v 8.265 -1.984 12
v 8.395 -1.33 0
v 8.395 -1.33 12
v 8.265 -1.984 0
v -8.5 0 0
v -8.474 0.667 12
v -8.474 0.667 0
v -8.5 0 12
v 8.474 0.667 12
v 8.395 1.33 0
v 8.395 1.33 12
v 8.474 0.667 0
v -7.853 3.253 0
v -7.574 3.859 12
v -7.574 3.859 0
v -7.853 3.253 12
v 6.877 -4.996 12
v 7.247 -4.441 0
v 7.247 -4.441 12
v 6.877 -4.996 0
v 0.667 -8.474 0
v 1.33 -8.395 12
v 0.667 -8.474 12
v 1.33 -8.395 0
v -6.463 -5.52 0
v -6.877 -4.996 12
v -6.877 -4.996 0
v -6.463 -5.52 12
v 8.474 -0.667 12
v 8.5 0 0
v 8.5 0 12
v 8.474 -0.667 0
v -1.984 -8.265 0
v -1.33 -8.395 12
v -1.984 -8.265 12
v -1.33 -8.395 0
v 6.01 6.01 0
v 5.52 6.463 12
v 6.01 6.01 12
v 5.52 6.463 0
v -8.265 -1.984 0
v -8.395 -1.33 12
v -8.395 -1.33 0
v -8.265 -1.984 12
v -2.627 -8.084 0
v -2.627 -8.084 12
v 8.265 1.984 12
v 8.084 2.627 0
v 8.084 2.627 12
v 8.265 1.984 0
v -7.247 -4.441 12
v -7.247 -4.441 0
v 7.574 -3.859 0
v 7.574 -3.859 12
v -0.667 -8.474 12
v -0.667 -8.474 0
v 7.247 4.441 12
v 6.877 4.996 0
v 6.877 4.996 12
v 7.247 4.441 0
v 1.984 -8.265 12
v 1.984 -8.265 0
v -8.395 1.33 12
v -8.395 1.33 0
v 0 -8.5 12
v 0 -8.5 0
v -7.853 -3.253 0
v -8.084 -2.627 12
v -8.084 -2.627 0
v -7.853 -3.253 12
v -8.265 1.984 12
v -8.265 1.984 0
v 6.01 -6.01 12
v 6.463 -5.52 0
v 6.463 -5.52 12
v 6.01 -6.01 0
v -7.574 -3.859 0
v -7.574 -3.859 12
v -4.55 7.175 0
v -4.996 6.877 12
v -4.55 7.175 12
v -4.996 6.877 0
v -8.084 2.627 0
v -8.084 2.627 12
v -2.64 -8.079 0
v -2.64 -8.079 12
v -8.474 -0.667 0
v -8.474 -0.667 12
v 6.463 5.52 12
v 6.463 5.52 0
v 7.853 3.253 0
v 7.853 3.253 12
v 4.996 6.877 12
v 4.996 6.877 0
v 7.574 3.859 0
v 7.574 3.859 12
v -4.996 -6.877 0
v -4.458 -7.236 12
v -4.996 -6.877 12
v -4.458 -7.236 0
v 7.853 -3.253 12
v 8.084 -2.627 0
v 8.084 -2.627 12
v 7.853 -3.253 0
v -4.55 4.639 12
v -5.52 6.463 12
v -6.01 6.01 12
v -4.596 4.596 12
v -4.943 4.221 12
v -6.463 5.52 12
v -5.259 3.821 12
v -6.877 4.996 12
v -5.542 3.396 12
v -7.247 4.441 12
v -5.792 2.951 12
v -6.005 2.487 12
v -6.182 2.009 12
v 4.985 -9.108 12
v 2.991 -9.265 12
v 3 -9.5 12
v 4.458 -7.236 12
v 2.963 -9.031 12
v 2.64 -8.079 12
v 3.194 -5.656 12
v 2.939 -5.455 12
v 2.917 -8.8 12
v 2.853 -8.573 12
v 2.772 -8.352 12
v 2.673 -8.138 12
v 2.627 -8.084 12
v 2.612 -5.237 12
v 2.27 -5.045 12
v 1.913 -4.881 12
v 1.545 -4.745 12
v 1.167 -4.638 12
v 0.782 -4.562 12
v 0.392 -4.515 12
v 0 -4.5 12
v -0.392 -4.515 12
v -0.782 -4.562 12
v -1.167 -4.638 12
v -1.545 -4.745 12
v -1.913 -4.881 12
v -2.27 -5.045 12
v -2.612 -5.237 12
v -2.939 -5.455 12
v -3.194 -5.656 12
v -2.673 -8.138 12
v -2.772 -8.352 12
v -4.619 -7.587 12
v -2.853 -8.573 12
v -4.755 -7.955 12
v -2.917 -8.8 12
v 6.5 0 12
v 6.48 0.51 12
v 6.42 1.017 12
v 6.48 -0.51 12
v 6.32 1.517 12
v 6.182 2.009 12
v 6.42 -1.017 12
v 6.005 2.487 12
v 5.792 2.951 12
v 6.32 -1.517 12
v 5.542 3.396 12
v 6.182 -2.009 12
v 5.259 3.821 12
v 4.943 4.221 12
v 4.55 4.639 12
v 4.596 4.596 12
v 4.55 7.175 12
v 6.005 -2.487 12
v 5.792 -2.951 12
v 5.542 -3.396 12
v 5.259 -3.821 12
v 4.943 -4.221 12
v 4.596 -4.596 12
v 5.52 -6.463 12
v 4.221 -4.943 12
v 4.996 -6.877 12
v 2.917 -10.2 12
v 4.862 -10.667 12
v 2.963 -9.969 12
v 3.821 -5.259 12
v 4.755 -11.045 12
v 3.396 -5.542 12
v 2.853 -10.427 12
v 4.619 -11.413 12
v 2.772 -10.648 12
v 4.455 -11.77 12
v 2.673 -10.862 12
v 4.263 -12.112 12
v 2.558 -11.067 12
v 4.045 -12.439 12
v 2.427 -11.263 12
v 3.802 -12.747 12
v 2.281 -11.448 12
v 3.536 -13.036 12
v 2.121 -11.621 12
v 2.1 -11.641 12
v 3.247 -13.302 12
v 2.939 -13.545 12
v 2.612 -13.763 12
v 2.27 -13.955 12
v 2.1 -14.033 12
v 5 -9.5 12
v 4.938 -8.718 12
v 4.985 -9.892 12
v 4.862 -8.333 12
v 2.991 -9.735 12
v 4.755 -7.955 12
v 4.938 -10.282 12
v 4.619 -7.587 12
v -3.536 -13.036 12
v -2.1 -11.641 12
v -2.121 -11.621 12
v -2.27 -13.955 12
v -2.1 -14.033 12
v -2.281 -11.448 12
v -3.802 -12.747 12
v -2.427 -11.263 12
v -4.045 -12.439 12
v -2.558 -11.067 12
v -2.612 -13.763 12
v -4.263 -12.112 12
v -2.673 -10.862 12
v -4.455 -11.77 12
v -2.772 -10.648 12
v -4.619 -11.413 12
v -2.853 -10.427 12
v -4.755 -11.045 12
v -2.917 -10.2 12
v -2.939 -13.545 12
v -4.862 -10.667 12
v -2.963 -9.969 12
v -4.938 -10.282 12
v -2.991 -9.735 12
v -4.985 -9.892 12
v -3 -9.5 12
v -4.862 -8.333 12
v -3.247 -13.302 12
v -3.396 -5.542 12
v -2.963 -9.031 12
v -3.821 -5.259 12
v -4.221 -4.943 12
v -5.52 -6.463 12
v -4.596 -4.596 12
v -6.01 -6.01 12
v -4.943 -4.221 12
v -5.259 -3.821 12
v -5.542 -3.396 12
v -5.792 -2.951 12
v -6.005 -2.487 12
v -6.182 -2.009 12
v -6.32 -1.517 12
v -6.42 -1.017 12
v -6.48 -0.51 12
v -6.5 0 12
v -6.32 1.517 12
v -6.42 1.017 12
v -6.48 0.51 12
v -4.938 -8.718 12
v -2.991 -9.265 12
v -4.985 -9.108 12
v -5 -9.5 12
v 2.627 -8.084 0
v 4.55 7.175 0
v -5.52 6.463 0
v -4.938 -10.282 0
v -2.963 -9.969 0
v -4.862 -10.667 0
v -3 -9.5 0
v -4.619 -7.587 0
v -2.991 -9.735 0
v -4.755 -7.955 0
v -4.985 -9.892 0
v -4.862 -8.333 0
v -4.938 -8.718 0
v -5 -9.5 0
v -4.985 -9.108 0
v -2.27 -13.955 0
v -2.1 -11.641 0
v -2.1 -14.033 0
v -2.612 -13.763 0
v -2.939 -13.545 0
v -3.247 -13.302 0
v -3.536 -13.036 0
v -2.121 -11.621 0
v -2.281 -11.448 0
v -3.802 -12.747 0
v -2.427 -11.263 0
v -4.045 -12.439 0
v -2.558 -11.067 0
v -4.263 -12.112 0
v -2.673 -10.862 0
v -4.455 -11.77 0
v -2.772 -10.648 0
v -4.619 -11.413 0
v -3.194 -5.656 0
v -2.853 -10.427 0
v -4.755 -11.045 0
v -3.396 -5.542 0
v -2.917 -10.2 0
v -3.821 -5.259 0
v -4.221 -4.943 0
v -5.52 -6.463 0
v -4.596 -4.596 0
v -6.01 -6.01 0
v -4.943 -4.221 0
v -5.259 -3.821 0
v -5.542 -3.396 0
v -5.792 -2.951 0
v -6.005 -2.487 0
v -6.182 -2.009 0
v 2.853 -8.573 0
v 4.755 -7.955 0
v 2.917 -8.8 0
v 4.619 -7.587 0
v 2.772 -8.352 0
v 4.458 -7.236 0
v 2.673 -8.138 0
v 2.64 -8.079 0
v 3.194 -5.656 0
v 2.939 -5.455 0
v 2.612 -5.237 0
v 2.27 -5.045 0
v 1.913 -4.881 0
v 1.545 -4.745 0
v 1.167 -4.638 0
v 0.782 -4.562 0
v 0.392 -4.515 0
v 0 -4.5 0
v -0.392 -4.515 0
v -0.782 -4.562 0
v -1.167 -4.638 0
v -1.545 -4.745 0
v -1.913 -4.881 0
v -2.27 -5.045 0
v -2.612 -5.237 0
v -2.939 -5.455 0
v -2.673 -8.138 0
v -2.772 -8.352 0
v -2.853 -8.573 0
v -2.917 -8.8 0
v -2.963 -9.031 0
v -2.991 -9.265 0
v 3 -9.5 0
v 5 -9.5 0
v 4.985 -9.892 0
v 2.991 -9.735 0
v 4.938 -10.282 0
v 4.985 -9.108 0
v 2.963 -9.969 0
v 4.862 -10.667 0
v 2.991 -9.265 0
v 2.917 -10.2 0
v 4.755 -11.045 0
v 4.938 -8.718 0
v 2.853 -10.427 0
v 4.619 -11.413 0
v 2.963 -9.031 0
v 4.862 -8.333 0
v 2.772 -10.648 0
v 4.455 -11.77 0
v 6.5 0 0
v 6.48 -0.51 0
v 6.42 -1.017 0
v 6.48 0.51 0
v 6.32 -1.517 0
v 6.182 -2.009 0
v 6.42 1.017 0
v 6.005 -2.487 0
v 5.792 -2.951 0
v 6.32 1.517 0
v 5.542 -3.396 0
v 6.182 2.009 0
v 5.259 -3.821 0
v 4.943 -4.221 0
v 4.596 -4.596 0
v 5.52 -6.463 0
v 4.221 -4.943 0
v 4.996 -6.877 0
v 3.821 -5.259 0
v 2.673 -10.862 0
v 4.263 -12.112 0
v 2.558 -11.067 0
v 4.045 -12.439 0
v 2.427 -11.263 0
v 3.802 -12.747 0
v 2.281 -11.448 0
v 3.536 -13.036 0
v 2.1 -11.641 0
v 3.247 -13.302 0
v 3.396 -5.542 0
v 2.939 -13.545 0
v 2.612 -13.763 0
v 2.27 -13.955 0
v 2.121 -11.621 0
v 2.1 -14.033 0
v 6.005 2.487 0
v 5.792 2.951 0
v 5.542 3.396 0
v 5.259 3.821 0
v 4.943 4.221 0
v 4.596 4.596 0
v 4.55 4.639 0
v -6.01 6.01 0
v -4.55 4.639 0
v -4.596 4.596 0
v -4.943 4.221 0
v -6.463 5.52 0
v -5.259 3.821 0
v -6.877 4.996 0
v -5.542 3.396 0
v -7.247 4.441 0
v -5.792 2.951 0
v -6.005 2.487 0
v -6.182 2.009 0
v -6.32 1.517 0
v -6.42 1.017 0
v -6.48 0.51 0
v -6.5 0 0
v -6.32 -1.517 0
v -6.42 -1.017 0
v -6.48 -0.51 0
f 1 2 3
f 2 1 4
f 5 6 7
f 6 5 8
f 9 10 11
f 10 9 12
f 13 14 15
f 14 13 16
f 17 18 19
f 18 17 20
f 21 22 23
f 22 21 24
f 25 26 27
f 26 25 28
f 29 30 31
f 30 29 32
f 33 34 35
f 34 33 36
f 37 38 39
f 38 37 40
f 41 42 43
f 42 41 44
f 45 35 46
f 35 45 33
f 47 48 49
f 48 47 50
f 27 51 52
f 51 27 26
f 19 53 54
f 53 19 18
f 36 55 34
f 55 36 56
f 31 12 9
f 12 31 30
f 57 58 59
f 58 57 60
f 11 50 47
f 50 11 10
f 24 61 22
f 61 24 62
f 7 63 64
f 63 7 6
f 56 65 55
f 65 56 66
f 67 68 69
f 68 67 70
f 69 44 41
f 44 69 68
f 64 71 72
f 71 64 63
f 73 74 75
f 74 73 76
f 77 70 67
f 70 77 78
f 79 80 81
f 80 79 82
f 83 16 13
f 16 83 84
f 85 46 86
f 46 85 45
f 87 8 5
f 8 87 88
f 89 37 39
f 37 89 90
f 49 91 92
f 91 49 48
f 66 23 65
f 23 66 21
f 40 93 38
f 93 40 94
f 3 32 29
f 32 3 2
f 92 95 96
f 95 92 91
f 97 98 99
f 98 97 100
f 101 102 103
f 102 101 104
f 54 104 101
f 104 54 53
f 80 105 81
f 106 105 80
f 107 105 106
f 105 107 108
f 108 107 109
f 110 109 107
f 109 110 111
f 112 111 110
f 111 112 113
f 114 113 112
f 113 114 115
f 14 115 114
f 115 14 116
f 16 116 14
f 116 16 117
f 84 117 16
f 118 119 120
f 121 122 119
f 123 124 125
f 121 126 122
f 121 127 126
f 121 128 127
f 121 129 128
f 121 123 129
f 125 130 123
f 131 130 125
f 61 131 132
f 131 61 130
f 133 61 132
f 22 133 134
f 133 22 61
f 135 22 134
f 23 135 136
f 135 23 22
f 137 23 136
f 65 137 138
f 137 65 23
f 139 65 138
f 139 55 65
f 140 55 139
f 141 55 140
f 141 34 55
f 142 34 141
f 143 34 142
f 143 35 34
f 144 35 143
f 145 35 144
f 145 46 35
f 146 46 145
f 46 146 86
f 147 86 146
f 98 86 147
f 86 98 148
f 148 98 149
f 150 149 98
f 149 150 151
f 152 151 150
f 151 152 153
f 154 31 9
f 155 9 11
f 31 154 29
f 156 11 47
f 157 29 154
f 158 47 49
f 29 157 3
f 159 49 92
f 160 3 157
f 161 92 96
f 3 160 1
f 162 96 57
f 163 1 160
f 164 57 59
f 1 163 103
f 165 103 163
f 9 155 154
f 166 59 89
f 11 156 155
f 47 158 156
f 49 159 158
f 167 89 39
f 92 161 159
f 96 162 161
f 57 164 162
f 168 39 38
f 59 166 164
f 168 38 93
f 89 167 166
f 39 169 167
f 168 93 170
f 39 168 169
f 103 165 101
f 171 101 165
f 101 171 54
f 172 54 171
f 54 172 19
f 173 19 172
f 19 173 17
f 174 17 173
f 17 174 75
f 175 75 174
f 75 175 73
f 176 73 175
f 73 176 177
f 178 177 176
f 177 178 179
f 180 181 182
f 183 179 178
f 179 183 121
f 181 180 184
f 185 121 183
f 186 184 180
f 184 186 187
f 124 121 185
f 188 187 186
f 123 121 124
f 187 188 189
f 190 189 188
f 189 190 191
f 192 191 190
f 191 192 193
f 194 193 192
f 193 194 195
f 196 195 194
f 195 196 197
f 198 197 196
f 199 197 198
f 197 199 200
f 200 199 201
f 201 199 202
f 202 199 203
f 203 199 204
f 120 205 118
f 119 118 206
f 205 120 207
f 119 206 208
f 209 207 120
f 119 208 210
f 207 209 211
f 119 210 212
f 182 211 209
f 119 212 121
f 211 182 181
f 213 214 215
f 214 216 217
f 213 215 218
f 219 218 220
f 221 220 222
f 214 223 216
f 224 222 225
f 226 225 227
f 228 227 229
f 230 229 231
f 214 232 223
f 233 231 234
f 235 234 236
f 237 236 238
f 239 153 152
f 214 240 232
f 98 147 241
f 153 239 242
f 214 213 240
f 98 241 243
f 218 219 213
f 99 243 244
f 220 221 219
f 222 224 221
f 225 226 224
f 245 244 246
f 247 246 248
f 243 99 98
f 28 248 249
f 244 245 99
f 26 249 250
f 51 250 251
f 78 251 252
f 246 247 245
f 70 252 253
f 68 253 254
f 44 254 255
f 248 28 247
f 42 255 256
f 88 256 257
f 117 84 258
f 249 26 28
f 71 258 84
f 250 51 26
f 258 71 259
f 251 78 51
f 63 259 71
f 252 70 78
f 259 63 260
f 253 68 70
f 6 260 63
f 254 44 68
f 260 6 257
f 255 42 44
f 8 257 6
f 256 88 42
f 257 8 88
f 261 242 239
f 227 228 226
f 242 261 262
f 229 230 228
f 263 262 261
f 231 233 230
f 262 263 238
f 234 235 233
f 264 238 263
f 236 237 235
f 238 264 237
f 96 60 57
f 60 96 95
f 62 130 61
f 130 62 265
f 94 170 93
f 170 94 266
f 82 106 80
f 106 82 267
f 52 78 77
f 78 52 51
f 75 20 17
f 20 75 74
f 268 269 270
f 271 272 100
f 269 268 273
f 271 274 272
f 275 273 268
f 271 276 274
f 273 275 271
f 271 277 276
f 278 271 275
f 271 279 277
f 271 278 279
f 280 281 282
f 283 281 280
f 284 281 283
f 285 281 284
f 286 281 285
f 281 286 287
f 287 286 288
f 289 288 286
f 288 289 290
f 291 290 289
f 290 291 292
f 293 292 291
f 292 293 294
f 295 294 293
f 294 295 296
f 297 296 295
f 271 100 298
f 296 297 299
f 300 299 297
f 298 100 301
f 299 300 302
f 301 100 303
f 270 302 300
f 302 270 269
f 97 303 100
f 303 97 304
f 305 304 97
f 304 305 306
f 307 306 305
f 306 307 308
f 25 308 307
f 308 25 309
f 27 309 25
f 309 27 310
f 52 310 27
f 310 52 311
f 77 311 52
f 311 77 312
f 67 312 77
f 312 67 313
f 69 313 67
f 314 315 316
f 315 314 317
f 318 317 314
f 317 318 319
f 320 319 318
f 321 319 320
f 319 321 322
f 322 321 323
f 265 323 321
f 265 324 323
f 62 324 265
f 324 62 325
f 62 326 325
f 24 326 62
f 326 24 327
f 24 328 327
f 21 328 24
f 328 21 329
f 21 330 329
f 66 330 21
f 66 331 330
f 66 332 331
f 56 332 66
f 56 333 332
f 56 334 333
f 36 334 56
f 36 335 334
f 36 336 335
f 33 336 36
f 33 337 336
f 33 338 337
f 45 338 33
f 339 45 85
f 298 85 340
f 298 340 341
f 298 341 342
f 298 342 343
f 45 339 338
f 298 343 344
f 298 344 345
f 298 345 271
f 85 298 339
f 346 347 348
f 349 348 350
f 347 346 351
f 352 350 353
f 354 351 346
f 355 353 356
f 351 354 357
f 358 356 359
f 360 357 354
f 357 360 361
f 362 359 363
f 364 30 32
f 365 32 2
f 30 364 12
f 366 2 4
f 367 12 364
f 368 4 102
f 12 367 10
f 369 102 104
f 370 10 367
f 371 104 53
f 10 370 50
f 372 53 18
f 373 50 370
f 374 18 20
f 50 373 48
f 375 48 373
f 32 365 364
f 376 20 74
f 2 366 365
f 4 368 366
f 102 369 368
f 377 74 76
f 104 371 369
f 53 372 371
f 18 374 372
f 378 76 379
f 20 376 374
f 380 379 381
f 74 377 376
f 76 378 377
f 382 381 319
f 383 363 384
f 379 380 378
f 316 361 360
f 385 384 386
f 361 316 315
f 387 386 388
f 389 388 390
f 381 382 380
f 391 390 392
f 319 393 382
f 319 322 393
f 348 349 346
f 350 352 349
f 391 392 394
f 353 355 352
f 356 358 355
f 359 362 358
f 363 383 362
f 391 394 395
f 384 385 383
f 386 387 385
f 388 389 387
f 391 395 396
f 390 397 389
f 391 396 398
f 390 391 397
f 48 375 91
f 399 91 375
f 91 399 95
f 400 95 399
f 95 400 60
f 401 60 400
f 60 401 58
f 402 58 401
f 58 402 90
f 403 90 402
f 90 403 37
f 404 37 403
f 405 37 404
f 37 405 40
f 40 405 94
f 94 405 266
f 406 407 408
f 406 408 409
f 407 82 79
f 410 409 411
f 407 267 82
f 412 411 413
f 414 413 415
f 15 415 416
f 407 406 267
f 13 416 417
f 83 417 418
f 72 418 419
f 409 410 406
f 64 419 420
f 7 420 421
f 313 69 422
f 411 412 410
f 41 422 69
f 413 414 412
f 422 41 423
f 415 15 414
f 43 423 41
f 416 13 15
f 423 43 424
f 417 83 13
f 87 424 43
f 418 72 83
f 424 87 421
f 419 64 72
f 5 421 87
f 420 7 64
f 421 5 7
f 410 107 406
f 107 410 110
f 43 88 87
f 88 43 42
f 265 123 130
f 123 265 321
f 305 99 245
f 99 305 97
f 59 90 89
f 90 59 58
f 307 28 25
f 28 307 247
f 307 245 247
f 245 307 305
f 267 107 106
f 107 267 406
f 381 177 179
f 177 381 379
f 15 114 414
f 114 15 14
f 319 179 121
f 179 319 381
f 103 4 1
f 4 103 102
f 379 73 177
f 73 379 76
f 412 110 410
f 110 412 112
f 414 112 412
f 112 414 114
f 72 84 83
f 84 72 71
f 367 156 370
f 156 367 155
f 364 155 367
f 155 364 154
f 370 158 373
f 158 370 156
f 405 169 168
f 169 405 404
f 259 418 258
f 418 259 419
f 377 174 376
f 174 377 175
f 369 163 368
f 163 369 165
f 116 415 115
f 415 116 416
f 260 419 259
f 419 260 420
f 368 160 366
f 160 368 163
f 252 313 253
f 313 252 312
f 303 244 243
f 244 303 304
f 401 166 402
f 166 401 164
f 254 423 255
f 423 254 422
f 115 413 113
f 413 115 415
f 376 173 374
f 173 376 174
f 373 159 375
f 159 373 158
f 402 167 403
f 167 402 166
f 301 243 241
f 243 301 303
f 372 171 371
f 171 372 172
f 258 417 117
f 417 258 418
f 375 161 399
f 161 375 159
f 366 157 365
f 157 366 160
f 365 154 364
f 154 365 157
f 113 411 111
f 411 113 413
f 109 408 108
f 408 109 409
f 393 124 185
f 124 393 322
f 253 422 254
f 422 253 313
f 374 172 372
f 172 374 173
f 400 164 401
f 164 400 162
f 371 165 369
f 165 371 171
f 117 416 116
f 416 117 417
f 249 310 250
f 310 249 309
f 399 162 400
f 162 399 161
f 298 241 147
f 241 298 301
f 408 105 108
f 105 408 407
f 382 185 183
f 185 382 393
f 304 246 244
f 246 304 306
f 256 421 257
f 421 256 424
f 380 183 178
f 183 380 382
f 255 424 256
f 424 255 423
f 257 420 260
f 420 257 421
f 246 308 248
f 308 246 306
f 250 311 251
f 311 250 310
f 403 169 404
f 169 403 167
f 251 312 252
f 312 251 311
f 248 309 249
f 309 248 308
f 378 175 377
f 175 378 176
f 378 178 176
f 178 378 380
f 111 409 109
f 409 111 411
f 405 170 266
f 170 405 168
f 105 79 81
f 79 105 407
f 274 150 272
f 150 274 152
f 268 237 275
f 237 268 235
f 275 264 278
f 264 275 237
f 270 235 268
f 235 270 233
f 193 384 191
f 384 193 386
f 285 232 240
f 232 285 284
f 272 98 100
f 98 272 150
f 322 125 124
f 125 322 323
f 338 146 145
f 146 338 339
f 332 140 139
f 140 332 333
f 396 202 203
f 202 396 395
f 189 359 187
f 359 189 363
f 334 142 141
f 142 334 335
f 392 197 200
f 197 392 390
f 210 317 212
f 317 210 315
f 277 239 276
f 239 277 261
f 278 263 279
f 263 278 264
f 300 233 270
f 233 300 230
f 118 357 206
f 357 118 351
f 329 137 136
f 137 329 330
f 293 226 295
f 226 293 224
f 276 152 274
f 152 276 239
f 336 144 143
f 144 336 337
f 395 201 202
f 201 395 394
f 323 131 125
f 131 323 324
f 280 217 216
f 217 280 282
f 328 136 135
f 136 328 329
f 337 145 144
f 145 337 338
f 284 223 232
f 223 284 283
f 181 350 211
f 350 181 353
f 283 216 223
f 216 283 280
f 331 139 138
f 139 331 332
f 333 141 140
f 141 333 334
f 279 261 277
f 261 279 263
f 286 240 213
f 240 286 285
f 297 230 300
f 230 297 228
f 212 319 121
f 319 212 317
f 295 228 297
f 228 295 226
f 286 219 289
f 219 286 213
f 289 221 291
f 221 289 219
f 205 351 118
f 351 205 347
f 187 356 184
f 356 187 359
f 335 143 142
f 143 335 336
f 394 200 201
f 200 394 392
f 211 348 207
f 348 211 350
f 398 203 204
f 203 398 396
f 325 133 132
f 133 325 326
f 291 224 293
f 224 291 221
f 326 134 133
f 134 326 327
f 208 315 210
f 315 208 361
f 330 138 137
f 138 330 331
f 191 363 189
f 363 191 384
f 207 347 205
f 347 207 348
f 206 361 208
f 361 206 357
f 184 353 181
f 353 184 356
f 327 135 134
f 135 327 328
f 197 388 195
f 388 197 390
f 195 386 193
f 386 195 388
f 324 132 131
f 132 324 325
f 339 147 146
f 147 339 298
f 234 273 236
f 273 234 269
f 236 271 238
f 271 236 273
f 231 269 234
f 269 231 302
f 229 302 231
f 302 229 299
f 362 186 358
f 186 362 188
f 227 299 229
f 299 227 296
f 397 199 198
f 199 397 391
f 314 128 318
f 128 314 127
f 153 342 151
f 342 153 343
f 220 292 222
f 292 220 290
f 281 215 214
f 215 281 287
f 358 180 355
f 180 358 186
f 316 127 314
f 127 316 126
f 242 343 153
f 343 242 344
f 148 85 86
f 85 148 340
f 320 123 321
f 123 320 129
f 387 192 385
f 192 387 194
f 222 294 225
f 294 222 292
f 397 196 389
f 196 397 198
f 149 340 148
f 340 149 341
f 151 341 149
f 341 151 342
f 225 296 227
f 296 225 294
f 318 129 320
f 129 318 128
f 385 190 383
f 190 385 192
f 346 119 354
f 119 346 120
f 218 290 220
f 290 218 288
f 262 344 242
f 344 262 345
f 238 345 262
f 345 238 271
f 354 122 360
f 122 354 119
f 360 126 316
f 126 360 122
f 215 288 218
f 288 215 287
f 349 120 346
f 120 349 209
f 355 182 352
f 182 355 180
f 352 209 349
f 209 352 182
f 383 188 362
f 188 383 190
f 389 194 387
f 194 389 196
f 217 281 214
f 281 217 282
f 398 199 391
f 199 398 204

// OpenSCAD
// Snap-on clip that holds a DS18B20 probe tight against a tube.
// Use 4 of these: in/out of the heat exchanger on BOTH loops.
tube_od   = 13;   // outside diameter of your tubing (mm)  (10/13 soft tube = 13)
probe_d   = 6;    // DS18B20 probe diameter (mm)
wall      = 2;    // plastic thickness (mm)
width     = 12;   // clip length along the tube (mm)
open_frac = 0.7;  // opening width as a fraction of diameter (snap-fit)
$fn = 80;

module c_ring(d) {
  difference() {
    cylinder(d = d + 2*wall, h = width);
    translate([0,0,-1]) cylinder(d = d, h = width + 2);
    translate([-d*open_frac/2, 0, -1]) cube([d*open_frac, d, width + 2]);  // snap opening
  }
}
c_ring(tube_od);
// probe ring sits touching the tube wall on the opposite side from the opening
translate([0, -(tube_od/2 + probe_d/2), 0]) rotate(180) c_ring(probe_d);
